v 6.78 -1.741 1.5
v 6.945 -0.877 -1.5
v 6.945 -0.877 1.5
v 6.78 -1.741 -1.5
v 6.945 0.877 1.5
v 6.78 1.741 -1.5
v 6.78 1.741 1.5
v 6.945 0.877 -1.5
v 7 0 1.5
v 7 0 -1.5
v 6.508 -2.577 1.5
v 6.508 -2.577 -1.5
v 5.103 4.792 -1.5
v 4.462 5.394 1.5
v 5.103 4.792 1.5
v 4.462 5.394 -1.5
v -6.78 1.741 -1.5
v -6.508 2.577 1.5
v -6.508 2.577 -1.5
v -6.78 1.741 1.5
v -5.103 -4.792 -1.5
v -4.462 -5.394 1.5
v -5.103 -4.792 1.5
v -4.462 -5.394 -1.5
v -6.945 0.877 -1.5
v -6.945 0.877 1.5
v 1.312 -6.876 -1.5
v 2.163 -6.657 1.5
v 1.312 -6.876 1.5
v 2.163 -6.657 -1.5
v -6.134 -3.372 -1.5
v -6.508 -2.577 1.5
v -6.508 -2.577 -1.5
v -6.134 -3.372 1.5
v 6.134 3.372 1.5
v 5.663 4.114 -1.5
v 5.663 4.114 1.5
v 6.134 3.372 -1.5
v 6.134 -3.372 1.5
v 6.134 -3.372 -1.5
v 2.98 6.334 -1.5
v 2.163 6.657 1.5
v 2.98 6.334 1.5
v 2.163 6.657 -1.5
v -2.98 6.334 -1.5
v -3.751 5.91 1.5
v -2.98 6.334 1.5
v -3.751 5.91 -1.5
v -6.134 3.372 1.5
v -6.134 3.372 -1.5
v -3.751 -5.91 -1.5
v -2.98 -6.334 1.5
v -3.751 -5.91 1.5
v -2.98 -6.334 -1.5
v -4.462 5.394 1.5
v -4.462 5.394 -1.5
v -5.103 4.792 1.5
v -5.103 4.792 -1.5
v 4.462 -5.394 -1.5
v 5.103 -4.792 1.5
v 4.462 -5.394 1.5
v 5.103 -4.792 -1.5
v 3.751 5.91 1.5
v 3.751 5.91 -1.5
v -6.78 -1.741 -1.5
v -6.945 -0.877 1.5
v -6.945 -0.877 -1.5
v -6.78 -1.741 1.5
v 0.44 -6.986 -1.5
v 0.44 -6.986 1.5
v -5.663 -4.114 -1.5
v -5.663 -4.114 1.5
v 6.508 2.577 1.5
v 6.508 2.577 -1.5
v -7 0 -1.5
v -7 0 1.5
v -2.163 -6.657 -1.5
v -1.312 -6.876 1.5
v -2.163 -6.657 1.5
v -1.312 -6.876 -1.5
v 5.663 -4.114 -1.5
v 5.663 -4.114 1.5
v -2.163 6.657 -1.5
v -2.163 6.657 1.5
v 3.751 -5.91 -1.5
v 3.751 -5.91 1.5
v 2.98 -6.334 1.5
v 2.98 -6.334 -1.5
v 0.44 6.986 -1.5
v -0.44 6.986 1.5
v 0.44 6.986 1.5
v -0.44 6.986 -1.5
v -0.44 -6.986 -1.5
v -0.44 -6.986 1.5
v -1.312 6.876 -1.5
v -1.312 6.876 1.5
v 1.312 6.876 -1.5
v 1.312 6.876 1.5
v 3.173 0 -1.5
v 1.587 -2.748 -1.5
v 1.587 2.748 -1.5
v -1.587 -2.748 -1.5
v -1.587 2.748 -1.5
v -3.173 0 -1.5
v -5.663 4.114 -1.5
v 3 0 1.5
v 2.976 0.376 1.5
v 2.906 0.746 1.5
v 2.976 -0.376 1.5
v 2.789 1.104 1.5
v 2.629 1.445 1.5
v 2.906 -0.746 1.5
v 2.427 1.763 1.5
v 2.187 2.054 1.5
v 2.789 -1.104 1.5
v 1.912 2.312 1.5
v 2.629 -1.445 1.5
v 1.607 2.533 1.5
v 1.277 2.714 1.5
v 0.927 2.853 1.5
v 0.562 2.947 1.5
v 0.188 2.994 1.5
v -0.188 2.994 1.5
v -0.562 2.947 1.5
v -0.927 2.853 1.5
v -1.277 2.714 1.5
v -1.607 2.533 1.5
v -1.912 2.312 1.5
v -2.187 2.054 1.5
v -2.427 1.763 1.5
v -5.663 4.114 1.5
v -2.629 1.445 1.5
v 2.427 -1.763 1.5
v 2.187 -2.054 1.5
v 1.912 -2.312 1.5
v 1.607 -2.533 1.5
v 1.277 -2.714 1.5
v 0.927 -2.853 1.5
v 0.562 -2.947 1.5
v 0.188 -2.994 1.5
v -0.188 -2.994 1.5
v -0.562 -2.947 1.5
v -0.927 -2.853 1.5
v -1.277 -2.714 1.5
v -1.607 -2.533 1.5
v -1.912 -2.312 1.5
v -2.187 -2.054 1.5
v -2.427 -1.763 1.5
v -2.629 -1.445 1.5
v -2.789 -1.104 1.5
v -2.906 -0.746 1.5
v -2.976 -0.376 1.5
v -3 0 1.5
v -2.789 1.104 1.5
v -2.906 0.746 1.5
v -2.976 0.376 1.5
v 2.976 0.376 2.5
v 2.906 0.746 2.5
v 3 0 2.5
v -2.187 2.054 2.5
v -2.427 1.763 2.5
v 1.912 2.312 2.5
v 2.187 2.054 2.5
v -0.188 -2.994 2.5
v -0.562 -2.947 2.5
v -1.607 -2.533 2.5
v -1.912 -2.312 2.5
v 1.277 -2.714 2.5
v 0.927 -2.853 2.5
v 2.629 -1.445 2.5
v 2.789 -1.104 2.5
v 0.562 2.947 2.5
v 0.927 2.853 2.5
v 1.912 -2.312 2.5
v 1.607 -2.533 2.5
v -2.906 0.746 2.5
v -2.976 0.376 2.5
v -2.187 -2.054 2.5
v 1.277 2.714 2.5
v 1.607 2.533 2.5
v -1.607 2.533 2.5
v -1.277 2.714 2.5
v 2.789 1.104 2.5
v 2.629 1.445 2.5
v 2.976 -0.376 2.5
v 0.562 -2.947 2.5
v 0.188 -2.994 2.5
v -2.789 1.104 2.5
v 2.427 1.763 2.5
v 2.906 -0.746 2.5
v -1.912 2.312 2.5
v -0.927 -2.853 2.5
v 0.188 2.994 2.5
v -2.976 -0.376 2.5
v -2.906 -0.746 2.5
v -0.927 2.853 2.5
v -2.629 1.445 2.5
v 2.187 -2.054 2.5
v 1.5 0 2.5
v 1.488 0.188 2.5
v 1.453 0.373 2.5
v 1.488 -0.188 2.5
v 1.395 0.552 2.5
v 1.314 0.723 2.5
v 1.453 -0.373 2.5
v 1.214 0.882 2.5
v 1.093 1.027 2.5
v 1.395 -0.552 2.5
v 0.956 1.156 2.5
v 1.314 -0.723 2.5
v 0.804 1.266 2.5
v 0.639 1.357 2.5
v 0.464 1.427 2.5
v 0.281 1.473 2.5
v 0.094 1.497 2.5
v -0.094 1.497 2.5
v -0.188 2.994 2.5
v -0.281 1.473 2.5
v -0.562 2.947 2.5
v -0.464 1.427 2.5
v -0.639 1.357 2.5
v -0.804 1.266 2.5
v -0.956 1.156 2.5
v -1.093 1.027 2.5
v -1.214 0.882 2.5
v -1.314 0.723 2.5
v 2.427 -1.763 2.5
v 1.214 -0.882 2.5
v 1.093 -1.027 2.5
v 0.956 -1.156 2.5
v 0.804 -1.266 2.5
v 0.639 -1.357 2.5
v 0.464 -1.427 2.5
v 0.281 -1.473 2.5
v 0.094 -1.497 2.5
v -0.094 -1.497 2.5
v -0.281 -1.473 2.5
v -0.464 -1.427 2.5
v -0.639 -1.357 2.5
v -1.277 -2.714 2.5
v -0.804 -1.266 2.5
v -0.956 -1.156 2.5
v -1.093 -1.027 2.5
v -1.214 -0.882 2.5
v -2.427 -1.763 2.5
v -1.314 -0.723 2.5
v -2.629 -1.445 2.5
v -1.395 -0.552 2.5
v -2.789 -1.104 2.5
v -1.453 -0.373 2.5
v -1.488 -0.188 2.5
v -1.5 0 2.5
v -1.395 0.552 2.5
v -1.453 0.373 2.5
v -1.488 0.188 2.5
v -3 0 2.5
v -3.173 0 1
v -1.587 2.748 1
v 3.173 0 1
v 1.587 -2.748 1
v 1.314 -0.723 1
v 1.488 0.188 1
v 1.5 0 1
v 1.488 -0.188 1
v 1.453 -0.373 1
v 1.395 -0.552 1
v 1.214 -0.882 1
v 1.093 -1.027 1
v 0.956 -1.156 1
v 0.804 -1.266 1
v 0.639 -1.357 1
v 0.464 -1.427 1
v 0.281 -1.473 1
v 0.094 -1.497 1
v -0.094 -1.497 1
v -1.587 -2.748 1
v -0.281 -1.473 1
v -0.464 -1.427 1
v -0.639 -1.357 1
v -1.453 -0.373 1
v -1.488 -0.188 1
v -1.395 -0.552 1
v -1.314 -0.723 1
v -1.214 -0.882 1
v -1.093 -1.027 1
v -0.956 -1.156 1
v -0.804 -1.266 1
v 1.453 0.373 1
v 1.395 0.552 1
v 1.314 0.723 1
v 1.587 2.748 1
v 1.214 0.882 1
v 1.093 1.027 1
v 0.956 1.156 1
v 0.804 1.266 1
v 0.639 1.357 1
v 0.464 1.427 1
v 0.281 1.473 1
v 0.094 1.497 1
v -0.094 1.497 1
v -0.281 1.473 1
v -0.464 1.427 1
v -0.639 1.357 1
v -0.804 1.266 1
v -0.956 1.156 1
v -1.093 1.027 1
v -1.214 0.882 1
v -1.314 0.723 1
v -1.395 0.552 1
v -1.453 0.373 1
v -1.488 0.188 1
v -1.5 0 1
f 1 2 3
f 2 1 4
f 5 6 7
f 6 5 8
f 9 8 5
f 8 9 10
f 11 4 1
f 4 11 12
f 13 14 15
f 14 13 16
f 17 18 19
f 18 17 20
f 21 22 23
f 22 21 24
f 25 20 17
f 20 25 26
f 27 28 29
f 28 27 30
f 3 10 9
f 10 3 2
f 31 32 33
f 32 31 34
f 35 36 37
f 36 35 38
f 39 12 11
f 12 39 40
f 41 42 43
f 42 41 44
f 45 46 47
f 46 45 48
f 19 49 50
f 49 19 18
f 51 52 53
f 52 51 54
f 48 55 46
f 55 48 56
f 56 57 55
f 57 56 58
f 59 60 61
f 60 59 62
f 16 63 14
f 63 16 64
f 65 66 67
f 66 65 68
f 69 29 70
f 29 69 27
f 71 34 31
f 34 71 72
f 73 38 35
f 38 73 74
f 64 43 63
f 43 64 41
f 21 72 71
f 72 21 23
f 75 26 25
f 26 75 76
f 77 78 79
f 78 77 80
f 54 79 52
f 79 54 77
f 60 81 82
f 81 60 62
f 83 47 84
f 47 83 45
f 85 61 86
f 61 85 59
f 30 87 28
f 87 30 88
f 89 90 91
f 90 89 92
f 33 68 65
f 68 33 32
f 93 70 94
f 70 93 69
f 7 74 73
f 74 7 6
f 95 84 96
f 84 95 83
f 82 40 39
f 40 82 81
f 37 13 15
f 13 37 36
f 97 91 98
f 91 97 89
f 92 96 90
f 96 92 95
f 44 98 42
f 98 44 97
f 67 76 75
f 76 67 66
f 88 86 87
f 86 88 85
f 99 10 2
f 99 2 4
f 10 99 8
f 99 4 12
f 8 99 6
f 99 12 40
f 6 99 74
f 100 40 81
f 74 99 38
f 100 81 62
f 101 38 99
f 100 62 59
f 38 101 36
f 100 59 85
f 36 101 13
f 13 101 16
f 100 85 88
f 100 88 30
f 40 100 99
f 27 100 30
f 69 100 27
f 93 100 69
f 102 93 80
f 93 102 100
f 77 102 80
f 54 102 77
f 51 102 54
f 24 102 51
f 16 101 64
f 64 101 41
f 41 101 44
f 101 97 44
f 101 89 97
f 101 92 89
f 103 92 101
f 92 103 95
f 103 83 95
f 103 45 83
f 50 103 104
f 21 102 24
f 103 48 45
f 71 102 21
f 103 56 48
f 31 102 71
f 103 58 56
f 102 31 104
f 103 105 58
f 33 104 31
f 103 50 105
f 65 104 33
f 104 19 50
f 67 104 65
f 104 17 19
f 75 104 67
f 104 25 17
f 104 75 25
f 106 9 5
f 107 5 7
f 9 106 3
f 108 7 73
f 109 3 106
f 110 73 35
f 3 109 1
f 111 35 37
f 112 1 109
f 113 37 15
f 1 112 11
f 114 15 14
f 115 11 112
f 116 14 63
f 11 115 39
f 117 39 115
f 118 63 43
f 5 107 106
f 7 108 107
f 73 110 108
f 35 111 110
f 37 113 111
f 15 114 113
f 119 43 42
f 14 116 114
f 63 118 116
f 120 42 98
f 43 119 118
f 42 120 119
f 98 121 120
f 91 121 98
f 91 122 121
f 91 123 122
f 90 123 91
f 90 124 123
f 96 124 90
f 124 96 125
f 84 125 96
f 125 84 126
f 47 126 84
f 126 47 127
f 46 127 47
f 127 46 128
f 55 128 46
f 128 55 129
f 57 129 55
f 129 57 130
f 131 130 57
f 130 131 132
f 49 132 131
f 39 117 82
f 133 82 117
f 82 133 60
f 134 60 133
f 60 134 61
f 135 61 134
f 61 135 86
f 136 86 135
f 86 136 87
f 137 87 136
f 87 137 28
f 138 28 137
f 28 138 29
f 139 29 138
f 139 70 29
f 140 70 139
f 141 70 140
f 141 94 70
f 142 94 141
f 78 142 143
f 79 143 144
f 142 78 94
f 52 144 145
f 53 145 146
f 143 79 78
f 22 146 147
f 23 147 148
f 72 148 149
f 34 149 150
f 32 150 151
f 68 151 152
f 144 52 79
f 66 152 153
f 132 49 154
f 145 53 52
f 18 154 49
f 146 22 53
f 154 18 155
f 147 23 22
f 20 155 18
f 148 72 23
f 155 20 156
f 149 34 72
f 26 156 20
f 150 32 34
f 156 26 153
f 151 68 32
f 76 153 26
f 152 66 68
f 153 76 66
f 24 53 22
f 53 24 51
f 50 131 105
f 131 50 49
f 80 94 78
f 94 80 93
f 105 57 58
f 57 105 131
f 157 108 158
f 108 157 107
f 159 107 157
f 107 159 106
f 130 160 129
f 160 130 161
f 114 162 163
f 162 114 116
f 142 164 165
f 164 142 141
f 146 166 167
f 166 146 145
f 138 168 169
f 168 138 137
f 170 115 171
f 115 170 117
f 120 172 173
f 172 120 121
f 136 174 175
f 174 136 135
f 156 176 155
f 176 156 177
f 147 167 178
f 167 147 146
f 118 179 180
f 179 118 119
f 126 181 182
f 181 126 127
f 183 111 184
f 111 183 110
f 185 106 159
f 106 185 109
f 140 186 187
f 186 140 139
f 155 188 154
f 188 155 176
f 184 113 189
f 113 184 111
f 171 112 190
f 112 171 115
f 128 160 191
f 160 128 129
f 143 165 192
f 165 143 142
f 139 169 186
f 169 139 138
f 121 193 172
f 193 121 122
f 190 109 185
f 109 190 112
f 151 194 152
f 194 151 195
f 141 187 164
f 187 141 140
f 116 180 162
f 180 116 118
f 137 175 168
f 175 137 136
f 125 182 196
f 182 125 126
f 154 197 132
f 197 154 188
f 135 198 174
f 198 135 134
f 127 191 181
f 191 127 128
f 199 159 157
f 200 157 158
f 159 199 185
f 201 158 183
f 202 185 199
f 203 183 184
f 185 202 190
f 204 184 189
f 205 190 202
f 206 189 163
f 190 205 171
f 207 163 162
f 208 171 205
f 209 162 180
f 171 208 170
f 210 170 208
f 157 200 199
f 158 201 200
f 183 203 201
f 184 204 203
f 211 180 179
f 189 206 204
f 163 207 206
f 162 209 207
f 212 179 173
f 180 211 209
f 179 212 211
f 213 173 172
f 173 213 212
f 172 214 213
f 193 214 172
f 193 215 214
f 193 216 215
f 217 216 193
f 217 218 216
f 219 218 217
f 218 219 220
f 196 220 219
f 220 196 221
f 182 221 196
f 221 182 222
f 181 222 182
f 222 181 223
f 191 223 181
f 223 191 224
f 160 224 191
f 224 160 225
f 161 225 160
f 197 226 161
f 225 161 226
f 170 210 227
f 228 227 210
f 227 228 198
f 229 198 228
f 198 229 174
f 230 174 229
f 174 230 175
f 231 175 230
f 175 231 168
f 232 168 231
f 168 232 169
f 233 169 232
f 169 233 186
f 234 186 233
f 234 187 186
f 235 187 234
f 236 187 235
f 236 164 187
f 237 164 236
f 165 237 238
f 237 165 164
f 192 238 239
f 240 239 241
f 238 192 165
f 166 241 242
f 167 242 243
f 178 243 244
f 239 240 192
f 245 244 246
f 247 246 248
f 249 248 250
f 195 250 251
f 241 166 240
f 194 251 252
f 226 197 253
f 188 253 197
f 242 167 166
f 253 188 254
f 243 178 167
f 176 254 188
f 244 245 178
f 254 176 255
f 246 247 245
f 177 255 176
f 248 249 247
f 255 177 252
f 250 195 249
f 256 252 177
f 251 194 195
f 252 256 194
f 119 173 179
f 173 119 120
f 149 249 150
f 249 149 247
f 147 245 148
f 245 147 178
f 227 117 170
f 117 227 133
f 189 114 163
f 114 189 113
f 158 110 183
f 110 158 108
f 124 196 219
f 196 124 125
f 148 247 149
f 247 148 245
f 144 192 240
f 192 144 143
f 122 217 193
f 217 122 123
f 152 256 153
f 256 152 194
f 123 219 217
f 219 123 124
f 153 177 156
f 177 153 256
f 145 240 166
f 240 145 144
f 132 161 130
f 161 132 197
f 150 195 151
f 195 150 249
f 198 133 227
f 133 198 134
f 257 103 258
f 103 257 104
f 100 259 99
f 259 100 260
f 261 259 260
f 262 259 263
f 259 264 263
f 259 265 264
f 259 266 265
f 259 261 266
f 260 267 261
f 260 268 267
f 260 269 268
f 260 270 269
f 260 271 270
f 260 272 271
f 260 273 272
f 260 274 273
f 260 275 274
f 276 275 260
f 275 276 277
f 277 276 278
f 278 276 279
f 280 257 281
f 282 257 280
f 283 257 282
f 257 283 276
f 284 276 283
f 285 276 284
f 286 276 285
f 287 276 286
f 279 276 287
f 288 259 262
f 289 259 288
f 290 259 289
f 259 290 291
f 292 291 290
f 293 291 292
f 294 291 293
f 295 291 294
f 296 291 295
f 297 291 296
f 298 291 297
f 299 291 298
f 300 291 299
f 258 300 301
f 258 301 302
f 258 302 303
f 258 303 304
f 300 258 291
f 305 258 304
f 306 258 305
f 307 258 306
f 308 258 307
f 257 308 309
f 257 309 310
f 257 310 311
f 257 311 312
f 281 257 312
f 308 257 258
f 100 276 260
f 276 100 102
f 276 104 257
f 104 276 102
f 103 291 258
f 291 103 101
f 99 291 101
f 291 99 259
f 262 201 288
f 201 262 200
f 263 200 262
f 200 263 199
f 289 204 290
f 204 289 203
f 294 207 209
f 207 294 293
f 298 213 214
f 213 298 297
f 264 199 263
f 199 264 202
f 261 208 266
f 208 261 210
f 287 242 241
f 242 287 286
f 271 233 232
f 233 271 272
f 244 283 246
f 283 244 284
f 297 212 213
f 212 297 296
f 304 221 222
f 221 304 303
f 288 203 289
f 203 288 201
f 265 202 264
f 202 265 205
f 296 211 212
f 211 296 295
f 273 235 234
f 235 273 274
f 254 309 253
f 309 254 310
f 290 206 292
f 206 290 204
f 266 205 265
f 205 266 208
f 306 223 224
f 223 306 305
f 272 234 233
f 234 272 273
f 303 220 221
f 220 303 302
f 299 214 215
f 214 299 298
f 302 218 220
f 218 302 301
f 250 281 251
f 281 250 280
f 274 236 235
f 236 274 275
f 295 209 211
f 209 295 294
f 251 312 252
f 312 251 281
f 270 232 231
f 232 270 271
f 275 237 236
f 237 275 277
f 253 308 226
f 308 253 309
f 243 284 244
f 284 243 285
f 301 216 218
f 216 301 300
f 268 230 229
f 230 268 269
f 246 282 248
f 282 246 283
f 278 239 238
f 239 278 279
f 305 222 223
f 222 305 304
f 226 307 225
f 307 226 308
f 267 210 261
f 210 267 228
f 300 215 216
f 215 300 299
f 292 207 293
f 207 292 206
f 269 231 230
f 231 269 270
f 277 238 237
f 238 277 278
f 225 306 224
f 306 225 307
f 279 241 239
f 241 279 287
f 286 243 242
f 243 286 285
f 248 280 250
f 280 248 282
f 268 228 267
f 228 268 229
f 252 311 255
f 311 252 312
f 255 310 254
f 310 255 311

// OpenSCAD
$fn = 50;


difference() {
	union() {
		translate(v = [0, 0, -1.5000000000]) {
			cylinder(h = 3, r = 7.0000000000);
		}
		translate(v = [0, 0, -1.5000000000]) {
			cylinder(h = 4, r = 3.0000000000);
		}
	}
	union() {
		translate(v = [0, 0, -1.5000000000]) {
			rotate(a = [0, 0, 0]) {
				difference() {
					union() {
						linear_extrude(height = 2.5000000000) {
							polygon(points = [[3.1735000000, 0.0000000000], [1.5867500000, 2.7483316189], [-1.5867500000, 2.7483316189], [-3.1735000000, 0.0000000000], [-1.5867500000, -2.7483316189], [1.5867500000, -2.7483316189]]);
						}
					}
					union();
				}
			}
		}
		translate(v = [0, 0, -100.0000000000]) {
			cylinder(h = 200, r = 1.5000000000);
		}
	}
}
